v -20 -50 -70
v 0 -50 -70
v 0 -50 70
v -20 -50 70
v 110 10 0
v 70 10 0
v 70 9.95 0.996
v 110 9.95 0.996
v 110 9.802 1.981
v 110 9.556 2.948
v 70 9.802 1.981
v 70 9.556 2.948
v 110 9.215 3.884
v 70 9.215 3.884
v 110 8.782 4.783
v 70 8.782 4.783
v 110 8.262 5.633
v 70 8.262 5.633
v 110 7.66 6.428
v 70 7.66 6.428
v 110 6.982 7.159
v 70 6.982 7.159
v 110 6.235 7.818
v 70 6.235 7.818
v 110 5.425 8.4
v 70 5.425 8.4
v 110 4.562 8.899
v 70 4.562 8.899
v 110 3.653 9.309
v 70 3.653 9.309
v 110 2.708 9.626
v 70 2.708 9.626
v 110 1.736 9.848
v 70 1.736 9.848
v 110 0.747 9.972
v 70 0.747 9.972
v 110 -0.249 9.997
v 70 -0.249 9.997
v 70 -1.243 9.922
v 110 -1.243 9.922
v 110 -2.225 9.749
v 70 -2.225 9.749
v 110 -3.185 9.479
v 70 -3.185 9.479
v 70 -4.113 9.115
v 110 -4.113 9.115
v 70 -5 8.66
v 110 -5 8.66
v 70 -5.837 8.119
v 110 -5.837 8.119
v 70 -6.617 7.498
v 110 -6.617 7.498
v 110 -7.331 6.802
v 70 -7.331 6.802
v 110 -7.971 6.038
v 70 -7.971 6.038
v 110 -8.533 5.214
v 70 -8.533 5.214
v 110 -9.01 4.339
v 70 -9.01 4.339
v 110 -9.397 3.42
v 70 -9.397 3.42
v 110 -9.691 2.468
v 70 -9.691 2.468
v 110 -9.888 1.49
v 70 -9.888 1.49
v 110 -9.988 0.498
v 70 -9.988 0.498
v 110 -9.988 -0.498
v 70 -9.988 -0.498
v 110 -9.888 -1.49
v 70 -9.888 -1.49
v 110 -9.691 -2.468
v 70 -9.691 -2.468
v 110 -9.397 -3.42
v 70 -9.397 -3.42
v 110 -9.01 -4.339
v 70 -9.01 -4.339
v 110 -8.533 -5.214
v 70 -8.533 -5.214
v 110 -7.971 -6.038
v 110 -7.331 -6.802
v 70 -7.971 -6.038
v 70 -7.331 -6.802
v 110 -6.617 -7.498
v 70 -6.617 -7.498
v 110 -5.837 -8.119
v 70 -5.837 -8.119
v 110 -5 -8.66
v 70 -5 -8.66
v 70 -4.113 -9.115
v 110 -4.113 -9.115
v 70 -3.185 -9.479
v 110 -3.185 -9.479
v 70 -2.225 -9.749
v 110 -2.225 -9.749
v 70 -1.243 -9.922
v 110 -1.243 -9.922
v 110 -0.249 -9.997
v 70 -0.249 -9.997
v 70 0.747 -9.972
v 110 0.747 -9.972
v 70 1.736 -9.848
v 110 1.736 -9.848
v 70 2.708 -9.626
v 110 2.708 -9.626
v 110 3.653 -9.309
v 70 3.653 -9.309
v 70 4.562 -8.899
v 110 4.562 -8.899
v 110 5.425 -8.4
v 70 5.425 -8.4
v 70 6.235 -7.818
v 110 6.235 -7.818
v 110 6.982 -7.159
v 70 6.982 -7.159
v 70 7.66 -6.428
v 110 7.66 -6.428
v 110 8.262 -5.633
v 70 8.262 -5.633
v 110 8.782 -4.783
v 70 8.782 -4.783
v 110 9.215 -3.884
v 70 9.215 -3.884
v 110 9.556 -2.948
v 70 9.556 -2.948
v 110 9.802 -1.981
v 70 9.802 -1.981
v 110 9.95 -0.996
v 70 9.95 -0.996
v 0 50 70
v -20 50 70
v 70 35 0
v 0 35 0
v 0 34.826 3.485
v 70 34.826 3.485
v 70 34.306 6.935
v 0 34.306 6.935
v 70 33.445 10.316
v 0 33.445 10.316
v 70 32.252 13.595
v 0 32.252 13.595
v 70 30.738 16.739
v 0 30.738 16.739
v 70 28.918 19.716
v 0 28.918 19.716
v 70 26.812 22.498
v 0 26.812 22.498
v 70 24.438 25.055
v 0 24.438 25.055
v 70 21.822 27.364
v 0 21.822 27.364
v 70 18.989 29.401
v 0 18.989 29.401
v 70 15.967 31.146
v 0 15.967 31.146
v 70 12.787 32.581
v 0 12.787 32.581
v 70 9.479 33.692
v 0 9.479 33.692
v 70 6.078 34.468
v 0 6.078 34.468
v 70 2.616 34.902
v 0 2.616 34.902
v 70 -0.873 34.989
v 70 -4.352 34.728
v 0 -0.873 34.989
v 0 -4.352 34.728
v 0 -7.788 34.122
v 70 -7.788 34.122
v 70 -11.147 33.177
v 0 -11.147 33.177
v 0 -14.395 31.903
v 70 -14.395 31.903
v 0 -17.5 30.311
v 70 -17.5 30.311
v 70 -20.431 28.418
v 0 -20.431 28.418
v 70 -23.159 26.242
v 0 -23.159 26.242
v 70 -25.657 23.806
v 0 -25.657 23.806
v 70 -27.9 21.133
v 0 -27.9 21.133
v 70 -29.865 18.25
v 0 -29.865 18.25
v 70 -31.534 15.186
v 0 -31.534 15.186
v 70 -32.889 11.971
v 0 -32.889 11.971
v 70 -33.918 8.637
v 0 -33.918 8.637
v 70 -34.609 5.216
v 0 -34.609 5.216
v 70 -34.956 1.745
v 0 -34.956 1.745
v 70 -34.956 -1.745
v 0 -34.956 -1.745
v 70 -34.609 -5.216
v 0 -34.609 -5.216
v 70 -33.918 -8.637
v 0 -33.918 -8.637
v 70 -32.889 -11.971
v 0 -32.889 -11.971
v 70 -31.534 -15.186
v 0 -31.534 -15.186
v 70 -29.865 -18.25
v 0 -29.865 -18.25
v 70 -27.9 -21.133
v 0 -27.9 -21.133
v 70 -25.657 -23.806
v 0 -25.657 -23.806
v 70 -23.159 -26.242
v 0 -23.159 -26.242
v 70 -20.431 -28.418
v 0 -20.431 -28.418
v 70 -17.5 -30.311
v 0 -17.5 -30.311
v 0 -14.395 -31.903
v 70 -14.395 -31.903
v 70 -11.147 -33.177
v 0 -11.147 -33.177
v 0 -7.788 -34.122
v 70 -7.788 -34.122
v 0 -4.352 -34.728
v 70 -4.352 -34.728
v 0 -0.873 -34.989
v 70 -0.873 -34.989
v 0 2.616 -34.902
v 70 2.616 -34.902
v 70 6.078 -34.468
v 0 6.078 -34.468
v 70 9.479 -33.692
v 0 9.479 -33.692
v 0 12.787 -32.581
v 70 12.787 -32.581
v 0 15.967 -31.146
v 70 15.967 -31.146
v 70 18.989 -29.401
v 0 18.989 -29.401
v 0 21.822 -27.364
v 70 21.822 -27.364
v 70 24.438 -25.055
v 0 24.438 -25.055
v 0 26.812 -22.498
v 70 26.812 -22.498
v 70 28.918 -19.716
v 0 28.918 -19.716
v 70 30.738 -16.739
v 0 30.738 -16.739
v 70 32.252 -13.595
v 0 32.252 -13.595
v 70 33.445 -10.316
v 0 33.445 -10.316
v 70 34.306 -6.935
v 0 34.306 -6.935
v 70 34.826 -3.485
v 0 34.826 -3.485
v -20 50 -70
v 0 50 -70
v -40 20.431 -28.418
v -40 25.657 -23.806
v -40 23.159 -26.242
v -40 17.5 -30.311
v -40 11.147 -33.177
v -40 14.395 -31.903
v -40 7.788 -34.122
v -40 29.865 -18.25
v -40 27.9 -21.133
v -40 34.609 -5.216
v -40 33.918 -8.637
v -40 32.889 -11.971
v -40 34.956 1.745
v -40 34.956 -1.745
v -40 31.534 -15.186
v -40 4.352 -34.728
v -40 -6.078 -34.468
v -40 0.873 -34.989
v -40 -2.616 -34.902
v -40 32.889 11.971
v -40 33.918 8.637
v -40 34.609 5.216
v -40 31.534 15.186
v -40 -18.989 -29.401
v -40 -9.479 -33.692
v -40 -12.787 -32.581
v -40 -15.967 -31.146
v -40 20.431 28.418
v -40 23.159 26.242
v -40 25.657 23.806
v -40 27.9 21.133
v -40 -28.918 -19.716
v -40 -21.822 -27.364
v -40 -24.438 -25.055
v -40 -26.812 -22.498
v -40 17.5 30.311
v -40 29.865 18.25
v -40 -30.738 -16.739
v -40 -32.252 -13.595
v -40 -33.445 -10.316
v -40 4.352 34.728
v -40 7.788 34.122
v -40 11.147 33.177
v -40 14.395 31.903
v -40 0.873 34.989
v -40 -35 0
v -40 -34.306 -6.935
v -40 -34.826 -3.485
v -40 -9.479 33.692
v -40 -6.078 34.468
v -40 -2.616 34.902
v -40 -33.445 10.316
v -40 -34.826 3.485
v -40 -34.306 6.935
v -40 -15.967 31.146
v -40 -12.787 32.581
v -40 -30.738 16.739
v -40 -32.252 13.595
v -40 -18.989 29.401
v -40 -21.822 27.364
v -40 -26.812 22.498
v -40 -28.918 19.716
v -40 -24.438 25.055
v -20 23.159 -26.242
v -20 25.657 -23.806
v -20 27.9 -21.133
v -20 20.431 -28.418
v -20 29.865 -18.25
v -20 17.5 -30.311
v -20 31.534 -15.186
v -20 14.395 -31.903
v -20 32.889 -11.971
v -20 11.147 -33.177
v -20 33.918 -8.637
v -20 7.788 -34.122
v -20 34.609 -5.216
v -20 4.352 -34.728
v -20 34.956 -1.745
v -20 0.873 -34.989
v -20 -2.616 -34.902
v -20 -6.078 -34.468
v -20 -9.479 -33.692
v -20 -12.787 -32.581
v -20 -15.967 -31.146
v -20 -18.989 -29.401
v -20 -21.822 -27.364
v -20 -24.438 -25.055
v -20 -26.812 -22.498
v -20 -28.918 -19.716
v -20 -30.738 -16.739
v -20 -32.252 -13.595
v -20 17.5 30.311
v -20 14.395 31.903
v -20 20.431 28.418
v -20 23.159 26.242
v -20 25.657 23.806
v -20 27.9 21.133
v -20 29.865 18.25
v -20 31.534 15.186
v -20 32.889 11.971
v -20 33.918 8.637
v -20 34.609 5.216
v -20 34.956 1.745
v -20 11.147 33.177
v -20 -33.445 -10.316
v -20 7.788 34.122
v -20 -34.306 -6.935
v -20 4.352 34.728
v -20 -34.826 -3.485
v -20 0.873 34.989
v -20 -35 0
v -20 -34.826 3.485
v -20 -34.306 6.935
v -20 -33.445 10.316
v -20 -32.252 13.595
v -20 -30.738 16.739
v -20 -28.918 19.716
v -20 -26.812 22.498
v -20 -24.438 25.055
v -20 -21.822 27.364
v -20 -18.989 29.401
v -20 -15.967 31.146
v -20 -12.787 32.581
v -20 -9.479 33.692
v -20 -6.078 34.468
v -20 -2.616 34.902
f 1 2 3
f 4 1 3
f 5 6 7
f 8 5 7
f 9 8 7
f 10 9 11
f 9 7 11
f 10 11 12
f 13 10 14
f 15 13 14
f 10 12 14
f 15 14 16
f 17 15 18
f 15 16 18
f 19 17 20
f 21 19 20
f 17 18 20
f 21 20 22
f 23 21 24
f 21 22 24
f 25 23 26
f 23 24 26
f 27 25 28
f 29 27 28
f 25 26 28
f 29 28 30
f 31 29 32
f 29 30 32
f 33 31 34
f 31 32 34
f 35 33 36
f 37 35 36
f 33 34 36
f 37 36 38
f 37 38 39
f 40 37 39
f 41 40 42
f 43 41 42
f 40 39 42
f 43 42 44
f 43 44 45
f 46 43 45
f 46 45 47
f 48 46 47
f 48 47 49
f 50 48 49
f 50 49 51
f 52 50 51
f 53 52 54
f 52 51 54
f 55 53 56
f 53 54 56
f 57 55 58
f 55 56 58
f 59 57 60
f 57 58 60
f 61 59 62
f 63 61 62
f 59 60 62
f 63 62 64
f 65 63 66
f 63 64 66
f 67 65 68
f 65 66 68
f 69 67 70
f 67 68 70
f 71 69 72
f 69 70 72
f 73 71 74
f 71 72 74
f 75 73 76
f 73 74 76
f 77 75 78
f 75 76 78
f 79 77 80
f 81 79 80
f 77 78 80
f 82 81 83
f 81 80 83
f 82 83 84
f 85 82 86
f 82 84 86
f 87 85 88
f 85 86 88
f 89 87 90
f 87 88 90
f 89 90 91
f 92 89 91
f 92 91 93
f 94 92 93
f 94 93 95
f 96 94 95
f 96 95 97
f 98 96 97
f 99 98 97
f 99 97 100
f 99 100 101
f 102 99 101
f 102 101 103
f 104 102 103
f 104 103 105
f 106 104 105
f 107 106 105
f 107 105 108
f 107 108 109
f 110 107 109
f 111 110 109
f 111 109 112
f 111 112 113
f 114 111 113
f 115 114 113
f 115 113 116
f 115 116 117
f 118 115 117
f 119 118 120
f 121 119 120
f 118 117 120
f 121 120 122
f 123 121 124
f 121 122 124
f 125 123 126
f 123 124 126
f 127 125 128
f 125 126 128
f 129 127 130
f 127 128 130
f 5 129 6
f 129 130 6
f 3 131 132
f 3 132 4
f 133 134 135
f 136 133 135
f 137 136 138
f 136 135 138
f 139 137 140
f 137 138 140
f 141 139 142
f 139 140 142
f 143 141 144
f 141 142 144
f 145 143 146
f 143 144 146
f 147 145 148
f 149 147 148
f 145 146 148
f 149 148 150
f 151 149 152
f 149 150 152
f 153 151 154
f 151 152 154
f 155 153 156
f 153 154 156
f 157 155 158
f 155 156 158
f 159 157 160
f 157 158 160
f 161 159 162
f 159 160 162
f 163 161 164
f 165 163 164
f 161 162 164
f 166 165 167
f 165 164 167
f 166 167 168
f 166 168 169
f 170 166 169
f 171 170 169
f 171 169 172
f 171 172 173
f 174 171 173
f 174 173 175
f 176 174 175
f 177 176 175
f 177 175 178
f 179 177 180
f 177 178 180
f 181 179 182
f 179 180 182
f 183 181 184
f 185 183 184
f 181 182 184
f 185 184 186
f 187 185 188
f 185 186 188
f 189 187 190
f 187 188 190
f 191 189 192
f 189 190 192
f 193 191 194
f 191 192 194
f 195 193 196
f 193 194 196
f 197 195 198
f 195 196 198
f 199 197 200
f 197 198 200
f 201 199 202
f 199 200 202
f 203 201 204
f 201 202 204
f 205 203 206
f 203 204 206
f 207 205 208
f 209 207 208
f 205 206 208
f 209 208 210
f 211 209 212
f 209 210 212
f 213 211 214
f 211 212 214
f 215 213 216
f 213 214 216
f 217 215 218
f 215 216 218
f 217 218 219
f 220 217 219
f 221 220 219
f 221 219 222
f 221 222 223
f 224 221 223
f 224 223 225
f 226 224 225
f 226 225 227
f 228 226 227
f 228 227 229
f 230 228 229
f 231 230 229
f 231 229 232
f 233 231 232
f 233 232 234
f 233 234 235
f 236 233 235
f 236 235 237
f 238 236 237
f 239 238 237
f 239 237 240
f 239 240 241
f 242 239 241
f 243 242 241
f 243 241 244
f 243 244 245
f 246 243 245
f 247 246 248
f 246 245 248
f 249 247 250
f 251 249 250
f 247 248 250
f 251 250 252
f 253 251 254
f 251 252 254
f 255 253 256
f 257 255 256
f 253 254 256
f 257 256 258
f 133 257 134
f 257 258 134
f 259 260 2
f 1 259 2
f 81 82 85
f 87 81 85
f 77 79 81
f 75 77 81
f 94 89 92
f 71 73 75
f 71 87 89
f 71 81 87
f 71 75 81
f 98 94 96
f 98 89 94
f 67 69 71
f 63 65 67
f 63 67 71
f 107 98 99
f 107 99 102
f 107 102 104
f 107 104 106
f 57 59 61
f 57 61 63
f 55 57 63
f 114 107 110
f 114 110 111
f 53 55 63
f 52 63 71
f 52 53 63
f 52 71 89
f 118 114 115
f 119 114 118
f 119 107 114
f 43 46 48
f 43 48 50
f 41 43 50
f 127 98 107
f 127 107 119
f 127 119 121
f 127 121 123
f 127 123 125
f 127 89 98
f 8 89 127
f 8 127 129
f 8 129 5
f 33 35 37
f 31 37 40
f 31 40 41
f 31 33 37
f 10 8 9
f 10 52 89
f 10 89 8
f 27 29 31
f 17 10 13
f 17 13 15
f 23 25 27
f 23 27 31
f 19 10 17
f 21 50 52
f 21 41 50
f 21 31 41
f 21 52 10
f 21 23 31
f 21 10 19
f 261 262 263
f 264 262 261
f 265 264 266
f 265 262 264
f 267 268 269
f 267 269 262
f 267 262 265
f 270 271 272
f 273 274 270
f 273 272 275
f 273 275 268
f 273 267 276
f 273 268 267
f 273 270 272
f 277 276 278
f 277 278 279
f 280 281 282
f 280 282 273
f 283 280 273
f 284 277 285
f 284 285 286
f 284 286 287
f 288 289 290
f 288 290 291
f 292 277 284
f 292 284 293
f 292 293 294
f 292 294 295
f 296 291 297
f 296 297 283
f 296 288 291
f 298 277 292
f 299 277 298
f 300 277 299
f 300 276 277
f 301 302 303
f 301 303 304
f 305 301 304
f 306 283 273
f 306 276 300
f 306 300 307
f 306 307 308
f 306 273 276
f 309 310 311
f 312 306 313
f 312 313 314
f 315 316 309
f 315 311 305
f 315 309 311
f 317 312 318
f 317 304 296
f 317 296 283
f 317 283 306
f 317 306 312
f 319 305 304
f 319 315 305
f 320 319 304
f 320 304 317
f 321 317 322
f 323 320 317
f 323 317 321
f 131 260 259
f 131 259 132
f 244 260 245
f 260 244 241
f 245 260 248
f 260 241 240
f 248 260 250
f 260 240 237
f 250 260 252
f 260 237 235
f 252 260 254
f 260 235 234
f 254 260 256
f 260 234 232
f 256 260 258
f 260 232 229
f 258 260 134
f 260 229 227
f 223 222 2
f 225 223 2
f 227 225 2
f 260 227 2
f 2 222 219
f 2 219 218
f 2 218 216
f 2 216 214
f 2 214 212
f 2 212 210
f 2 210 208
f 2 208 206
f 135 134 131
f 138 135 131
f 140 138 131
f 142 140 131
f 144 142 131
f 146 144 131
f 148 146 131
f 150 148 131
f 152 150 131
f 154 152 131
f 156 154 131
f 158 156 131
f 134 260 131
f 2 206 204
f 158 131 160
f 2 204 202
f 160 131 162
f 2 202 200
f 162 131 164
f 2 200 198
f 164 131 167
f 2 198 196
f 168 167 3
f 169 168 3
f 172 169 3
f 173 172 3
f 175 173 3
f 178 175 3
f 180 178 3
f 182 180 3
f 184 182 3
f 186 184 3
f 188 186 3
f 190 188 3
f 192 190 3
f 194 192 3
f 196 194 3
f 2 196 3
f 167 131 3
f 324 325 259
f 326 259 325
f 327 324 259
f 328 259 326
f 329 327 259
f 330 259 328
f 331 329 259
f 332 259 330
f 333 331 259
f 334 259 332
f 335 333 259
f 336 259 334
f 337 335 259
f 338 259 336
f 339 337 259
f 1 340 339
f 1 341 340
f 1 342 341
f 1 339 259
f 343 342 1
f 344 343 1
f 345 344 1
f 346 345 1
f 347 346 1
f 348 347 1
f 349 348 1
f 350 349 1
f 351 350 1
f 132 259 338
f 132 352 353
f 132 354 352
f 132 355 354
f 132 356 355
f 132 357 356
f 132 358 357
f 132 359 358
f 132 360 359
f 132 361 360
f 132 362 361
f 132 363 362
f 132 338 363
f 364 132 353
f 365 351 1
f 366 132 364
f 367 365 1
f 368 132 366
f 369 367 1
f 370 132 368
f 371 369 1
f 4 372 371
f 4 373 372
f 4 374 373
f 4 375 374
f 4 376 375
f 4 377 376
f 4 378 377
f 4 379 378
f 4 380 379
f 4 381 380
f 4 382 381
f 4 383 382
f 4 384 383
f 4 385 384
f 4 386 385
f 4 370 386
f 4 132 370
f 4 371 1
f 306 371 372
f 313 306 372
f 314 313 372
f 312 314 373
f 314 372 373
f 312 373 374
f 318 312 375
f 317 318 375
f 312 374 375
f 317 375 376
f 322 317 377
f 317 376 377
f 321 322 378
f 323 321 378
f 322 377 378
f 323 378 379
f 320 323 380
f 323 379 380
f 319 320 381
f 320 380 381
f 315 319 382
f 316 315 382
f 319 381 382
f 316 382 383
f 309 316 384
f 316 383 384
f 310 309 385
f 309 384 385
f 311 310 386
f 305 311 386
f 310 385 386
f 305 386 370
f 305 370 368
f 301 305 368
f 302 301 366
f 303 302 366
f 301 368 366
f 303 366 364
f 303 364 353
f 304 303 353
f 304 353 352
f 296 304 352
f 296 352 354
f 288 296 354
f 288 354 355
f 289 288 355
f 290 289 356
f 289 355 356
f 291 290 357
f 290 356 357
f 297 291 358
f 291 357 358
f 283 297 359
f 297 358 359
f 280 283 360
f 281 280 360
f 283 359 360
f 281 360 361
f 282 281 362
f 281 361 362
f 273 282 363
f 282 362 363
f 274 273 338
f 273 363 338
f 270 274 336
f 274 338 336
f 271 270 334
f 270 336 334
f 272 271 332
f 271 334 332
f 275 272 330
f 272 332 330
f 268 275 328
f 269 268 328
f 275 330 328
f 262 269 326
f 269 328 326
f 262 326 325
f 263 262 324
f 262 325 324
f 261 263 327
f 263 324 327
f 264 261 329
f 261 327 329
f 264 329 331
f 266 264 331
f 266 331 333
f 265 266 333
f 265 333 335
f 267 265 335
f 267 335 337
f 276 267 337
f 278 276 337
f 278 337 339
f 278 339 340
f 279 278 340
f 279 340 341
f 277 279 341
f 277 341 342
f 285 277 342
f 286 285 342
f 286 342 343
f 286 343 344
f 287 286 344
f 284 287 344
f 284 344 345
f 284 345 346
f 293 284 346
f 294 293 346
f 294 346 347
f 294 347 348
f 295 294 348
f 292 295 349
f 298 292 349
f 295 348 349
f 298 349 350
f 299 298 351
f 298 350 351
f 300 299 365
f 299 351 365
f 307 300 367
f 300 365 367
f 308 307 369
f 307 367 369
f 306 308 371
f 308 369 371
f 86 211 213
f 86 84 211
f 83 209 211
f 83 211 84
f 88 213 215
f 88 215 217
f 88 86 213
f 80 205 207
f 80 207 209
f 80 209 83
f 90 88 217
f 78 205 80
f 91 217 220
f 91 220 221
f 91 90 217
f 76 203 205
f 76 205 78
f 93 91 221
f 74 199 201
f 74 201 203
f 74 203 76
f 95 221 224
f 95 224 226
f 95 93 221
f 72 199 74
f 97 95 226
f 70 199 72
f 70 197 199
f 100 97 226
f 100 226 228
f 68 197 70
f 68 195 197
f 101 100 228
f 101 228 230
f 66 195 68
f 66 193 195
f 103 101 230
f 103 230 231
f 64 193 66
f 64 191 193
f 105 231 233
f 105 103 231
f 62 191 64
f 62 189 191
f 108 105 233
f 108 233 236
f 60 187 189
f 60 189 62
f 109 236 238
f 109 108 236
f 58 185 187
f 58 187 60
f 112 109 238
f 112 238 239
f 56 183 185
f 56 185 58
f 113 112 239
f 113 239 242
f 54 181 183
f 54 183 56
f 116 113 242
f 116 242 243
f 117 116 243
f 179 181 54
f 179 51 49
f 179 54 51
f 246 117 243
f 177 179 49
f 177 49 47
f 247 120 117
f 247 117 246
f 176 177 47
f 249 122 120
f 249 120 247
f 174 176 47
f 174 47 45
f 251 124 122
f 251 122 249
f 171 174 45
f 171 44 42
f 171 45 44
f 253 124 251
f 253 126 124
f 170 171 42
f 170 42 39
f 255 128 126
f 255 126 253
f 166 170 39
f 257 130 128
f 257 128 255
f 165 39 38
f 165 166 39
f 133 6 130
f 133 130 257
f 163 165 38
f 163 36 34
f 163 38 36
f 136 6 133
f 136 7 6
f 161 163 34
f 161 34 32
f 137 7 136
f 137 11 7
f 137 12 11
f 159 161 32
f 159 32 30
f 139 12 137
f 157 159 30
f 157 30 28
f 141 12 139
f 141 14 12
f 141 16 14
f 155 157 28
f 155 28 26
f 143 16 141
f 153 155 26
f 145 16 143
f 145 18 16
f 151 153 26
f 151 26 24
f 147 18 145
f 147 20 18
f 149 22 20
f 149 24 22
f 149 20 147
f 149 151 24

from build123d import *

# Parameters (mm, degrees)
F0_R     = 35
F1_DEPTH = 70
F2_R     = 10
F3_DEPTH = 40
F4_W     = 100
F4_H     = 140
F4_R     = 35
F5_DEPTH = 20
F6_R     = 35
F7_DEPTH = 20


with BuildPart() as f1:
    # F0 (on Right) → F1 (new body)
    with BuildSketch(Plane.YZ):
        Circle(F0_R)
    extrude(amount=F1_DEPTH)

    # F2 (on face) → F3 (join)
    with BuildSketch(Plane.YZ.offset(70)):
        Circle(F2_R)
    extrude(amount=F3_DEPTH)

    # F4 (on face) → F5 (join)
    with BuildSketch(Plane(origin=(0, 0, 0), x_dir=(0, -1, 0), z_dir=(-1, 0, 0))):
        Rectangle(F4_W, F4_H)
        Circle(F4_R, mode=Mode.SUBTRACT)
        Circle(F4_R)
    extrude(amount=F5_DEPTH)

    # F6 (on face) → F7 (join)
    with BuildSketch(Plane(origin=(-20, 0, 0), x_dir=(0, -1, 0), z_dir=(-1, 0, 0))):
        Circle(F6_R)
    extrude(amount=F7_DEPTH)


solid = f1.part
